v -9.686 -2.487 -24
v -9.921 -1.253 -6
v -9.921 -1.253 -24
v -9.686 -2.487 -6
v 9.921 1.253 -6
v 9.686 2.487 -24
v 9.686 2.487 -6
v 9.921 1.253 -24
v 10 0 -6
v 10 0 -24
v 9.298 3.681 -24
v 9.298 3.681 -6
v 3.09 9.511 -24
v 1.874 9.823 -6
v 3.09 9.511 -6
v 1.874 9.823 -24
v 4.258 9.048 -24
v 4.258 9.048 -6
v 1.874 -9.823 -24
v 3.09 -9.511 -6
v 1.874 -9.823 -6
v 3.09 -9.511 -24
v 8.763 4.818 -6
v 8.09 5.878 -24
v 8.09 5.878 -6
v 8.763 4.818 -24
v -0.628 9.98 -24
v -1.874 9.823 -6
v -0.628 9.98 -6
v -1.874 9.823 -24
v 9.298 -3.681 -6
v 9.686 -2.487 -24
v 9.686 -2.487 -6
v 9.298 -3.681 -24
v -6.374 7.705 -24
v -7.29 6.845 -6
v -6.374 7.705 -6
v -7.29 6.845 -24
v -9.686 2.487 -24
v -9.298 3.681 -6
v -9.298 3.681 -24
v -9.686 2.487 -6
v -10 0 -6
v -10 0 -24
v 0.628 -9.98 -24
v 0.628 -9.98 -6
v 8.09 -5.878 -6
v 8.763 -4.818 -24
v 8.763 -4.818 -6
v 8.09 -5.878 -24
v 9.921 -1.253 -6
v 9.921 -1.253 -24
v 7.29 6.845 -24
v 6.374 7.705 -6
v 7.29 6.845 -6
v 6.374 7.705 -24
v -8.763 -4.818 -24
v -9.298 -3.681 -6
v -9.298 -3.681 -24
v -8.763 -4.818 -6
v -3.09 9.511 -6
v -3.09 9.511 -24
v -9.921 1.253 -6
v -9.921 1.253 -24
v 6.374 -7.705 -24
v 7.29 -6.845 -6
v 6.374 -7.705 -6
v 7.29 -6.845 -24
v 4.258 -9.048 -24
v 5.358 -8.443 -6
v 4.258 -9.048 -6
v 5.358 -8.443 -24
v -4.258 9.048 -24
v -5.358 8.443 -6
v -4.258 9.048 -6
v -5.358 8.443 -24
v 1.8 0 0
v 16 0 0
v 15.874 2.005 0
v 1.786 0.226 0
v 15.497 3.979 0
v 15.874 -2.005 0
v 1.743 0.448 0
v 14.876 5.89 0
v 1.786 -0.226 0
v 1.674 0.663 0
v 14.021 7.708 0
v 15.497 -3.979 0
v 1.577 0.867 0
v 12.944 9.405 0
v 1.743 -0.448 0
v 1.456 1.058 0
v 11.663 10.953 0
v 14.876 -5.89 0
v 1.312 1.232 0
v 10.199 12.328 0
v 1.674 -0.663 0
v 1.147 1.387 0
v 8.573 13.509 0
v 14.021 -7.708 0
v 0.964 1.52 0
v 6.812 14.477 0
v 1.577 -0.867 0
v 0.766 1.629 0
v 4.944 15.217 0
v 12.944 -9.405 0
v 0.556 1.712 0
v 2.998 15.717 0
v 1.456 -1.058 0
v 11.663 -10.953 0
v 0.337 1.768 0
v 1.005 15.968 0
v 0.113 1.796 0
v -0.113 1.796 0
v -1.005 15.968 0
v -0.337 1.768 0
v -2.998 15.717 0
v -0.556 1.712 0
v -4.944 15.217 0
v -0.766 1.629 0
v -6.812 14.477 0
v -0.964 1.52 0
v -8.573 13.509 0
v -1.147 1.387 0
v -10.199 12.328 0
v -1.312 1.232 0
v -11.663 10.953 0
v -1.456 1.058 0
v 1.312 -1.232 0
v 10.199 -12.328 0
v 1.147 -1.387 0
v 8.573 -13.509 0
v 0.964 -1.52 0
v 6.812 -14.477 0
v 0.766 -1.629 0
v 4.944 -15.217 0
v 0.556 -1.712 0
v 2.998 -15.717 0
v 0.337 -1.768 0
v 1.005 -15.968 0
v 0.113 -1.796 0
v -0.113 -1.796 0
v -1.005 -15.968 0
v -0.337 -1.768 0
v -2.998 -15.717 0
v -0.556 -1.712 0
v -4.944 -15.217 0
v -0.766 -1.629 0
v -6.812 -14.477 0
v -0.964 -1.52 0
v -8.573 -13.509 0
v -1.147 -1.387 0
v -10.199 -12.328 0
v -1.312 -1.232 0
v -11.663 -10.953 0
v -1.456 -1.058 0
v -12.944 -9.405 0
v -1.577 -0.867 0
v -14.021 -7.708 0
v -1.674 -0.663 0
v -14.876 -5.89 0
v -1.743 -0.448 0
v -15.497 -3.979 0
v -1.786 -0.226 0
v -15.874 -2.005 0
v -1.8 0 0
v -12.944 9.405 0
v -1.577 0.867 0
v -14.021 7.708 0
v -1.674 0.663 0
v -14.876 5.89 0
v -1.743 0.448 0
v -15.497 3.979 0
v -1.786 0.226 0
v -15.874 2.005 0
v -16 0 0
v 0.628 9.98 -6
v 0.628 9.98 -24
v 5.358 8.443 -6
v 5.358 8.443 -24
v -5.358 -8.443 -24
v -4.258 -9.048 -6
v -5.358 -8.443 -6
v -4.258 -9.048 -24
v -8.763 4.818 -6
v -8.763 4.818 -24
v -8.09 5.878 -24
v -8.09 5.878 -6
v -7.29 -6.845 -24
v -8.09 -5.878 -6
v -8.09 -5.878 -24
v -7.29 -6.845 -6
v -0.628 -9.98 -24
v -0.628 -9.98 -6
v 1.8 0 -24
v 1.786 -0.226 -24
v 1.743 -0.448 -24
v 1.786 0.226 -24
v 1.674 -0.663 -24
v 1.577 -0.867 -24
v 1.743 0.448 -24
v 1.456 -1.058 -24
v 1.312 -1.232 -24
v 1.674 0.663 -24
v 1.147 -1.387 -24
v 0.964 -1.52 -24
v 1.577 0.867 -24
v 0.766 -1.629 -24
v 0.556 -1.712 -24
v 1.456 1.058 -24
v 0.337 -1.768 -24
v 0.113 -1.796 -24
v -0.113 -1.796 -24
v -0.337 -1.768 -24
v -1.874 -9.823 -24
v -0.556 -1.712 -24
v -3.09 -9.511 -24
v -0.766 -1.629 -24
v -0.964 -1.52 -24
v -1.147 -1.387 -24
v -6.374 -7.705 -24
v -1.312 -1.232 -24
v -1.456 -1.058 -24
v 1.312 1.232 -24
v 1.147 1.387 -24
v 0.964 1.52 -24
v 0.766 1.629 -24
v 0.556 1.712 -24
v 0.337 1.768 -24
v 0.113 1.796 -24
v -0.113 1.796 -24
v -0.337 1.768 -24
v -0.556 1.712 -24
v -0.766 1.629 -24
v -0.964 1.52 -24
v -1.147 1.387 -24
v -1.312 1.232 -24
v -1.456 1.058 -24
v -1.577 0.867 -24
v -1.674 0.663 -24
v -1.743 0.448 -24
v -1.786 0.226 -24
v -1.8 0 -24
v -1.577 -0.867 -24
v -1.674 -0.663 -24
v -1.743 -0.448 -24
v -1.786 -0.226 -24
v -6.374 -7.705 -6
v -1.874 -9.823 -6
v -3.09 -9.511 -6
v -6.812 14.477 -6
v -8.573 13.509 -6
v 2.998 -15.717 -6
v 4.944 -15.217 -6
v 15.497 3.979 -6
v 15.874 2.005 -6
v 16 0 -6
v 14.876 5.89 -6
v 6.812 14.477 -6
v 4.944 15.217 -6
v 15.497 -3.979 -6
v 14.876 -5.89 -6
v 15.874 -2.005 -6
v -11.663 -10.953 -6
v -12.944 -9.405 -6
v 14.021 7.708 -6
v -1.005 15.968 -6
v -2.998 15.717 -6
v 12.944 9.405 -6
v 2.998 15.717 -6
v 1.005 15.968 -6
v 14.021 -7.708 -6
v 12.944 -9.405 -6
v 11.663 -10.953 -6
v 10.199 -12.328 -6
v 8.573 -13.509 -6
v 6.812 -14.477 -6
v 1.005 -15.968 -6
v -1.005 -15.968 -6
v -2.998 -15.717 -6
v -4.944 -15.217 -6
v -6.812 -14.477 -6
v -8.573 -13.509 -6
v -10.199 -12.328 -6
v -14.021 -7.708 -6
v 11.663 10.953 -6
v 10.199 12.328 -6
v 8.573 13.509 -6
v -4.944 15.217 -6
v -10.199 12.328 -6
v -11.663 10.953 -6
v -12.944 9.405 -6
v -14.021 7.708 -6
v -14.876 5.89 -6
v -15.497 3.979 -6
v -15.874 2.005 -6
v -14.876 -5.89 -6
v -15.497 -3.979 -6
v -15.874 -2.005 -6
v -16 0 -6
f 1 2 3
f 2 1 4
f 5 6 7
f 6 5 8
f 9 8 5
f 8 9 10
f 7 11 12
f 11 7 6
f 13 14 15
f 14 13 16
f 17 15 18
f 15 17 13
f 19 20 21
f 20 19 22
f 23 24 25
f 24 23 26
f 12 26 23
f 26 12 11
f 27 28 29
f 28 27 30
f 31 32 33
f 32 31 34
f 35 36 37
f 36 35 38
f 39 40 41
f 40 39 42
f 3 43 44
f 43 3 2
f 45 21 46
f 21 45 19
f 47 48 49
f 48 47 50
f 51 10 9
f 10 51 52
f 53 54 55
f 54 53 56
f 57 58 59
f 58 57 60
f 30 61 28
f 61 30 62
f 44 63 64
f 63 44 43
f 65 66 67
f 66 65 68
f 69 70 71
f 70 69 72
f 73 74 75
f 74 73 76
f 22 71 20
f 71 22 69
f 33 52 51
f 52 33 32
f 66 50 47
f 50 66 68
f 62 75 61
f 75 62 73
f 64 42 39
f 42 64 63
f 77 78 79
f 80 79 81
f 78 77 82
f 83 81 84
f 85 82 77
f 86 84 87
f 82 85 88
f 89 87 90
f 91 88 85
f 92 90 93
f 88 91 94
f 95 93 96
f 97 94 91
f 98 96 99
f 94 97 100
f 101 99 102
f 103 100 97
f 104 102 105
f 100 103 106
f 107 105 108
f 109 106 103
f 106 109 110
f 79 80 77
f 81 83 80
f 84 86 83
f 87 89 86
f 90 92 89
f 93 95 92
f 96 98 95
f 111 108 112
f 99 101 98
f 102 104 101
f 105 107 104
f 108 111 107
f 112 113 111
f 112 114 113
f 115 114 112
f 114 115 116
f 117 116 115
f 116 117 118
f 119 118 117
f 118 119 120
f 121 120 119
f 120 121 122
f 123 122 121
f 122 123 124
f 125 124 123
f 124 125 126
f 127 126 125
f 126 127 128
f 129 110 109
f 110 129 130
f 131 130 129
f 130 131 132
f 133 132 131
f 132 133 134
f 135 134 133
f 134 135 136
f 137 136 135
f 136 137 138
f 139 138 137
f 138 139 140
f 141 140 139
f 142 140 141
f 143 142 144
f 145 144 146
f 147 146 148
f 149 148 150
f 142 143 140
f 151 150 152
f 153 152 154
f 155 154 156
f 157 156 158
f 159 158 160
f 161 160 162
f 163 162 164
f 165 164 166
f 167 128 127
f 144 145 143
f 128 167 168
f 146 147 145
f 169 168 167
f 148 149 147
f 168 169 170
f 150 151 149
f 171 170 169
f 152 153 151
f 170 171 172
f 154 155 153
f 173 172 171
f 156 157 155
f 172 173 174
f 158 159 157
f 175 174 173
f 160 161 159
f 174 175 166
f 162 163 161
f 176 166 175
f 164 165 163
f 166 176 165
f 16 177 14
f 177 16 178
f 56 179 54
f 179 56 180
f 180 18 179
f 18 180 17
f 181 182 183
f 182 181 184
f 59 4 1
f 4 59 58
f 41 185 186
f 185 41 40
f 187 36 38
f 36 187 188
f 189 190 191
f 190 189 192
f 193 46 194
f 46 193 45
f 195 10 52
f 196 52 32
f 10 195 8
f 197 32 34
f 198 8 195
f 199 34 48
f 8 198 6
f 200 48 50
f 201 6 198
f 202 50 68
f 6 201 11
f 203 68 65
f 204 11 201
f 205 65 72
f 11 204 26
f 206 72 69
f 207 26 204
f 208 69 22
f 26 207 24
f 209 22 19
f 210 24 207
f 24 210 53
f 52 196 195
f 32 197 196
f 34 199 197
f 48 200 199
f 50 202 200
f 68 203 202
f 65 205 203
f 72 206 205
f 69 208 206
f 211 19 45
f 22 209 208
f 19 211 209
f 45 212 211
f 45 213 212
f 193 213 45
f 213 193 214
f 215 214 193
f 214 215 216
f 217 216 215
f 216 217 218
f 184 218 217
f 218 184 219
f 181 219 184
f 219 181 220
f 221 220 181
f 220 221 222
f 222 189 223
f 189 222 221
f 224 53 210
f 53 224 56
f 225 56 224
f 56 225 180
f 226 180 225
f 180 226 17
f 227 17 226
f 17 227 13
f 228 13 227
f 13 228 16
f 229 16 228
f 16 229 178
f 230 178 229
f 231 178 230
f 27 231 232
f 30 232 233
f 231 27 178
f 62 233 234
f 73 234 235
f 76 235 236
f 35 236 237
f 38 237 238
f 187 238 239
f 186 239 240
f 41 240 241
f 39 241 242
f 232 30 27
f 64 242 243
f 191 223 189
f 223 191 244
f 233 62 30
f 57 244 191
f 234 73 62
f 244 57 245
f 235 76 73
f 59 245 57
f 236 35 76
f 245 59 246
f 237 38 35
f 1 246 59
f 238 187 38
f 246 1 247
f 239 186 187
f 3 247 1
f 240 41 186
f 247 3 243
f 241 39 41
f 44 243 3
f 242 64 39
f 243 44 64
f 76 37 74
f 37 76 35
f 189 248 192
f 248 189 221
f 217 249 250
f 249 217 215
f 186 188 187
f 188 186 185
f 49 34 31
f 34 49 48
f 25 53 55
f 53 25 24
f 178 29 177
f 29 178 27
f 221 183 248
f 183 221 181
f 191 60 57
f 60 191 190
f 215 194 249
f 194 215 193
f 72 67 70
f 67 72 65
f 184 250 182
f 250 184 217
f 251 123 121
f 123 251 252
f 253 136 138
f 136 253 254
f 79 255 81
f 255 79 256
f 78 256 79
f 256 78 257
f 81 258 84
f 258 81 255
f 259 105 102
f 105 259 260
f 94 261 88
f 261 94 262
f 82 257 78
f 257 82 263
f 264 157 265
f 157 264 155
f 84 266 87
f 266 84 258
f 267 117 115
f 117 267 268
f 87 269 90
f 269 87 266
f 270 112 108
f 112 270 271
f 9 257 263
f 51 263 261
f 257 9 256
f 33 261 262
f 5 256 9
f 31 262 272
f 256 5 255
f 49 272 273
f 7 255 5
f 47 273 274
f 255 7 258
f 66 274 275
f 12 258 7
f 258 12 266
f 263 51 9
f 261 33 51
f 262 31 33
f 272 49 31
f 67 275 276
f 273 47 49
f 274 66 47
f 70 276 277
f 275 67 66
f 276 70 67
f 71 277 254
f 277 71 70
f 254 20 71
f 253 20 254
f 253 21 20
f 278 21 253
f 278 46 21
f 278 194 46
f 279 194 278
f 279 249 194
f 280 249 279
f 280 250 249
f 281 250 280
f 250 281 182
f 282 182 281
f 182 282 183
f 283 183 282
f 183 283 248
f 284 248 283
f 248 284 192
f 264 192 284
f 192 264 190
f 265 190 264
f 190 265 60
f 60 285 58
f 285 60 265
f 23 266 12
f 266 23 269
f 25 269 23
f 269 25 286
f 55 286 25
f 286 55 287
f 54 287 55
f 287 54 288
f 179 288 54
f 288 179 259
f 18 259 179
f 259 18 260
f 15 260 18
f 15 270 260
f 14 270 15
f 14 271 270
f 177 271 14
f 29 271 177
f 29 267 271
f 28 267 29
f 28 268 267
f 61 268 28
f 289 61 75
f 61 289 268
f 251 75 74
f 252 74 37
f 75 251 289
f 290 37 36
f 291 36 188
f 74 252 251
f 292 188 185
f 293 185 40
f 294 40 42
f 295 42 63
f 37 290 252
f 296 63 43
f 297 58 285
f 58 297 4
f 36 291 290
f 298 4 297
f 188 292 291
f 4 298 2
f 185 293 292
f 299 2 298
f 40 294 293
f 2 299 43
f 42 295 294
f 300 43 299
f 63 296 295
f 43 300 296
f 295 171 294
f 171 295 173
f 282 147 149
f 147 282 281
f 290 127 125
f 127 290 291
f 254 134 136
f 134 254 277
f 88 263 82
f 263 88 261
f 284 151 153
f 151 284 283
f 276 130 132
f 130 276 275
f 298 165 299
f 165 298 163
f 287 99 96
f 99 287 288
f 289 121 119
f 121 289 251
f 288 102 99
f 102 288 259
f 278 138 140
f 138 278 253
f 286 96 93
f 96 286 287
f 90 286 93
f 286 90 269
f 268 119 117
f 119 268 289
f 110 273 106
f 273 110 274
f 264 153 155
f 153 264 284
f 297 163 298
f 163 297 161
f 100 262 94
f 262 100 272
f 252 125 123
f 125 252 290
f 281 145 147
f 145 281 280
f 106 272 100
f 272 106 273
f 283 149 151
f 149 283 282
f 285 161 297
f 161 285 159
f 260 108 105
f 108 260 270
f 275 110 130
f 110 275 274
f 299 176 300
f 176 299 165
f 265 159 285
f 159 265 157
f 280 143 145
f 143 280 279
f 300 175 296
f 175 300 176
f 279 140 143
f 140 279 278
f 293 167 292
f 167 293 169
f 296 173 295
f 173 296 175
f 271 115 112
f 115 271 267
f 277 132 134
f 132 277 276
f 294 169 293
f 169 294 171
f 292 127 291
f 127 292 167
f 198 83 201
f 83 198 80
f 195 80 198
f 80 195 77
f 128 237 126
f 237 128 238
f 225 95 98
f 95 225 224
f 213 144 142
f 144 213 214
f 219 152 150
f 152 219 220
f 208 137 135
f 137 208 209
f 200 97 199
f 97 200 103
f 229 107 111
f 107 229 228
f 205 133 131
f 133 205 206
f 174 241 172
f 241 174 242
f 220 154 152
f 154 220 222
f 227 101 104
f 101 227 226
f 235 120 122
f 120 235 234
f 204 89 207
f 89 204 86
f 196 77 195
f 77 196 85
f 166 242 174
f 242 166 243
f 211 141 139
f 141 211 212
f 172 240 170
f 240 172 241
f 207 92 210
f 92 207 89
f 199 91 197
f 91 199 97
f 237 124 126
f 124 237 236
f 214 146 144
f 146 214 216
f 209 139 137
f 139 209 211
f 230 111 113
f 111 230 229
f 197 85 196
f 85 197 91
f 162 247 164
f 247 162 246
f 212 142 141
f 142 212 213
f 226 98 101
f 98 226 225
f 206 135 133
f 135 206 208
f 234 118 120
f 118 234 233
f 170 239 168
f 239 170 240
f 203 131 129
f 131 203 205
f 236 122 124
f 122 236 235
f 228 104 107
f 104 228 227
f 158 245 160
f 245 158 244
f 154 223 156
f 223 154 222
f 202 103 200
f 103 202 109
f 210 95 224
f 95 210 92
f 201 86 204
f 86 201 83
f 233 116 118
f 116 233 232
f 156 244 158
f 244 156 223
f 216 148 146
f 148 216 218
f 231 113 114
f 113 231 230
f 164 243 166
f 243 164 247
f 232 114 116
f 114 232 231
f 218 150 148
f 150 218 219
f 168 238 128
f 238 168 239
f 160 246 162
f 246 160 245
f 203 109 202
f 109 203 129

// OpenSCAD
$fn = 50;


difference() {
	union() {
		translate(v = [0, 0, -24.0000000000]) {
			cylinder(h = 24, r = 10.0000000000);
		}
		translate(v = [0, 0, -6.0000000000]) {
			cylinder(h = 6, r = 16.0000000000);
		}
	}
	union() {
		#translate(v = [0, 0, -24]) {
			cylinder(h = 24, r = 1.8000000000);
		}
	}
}
